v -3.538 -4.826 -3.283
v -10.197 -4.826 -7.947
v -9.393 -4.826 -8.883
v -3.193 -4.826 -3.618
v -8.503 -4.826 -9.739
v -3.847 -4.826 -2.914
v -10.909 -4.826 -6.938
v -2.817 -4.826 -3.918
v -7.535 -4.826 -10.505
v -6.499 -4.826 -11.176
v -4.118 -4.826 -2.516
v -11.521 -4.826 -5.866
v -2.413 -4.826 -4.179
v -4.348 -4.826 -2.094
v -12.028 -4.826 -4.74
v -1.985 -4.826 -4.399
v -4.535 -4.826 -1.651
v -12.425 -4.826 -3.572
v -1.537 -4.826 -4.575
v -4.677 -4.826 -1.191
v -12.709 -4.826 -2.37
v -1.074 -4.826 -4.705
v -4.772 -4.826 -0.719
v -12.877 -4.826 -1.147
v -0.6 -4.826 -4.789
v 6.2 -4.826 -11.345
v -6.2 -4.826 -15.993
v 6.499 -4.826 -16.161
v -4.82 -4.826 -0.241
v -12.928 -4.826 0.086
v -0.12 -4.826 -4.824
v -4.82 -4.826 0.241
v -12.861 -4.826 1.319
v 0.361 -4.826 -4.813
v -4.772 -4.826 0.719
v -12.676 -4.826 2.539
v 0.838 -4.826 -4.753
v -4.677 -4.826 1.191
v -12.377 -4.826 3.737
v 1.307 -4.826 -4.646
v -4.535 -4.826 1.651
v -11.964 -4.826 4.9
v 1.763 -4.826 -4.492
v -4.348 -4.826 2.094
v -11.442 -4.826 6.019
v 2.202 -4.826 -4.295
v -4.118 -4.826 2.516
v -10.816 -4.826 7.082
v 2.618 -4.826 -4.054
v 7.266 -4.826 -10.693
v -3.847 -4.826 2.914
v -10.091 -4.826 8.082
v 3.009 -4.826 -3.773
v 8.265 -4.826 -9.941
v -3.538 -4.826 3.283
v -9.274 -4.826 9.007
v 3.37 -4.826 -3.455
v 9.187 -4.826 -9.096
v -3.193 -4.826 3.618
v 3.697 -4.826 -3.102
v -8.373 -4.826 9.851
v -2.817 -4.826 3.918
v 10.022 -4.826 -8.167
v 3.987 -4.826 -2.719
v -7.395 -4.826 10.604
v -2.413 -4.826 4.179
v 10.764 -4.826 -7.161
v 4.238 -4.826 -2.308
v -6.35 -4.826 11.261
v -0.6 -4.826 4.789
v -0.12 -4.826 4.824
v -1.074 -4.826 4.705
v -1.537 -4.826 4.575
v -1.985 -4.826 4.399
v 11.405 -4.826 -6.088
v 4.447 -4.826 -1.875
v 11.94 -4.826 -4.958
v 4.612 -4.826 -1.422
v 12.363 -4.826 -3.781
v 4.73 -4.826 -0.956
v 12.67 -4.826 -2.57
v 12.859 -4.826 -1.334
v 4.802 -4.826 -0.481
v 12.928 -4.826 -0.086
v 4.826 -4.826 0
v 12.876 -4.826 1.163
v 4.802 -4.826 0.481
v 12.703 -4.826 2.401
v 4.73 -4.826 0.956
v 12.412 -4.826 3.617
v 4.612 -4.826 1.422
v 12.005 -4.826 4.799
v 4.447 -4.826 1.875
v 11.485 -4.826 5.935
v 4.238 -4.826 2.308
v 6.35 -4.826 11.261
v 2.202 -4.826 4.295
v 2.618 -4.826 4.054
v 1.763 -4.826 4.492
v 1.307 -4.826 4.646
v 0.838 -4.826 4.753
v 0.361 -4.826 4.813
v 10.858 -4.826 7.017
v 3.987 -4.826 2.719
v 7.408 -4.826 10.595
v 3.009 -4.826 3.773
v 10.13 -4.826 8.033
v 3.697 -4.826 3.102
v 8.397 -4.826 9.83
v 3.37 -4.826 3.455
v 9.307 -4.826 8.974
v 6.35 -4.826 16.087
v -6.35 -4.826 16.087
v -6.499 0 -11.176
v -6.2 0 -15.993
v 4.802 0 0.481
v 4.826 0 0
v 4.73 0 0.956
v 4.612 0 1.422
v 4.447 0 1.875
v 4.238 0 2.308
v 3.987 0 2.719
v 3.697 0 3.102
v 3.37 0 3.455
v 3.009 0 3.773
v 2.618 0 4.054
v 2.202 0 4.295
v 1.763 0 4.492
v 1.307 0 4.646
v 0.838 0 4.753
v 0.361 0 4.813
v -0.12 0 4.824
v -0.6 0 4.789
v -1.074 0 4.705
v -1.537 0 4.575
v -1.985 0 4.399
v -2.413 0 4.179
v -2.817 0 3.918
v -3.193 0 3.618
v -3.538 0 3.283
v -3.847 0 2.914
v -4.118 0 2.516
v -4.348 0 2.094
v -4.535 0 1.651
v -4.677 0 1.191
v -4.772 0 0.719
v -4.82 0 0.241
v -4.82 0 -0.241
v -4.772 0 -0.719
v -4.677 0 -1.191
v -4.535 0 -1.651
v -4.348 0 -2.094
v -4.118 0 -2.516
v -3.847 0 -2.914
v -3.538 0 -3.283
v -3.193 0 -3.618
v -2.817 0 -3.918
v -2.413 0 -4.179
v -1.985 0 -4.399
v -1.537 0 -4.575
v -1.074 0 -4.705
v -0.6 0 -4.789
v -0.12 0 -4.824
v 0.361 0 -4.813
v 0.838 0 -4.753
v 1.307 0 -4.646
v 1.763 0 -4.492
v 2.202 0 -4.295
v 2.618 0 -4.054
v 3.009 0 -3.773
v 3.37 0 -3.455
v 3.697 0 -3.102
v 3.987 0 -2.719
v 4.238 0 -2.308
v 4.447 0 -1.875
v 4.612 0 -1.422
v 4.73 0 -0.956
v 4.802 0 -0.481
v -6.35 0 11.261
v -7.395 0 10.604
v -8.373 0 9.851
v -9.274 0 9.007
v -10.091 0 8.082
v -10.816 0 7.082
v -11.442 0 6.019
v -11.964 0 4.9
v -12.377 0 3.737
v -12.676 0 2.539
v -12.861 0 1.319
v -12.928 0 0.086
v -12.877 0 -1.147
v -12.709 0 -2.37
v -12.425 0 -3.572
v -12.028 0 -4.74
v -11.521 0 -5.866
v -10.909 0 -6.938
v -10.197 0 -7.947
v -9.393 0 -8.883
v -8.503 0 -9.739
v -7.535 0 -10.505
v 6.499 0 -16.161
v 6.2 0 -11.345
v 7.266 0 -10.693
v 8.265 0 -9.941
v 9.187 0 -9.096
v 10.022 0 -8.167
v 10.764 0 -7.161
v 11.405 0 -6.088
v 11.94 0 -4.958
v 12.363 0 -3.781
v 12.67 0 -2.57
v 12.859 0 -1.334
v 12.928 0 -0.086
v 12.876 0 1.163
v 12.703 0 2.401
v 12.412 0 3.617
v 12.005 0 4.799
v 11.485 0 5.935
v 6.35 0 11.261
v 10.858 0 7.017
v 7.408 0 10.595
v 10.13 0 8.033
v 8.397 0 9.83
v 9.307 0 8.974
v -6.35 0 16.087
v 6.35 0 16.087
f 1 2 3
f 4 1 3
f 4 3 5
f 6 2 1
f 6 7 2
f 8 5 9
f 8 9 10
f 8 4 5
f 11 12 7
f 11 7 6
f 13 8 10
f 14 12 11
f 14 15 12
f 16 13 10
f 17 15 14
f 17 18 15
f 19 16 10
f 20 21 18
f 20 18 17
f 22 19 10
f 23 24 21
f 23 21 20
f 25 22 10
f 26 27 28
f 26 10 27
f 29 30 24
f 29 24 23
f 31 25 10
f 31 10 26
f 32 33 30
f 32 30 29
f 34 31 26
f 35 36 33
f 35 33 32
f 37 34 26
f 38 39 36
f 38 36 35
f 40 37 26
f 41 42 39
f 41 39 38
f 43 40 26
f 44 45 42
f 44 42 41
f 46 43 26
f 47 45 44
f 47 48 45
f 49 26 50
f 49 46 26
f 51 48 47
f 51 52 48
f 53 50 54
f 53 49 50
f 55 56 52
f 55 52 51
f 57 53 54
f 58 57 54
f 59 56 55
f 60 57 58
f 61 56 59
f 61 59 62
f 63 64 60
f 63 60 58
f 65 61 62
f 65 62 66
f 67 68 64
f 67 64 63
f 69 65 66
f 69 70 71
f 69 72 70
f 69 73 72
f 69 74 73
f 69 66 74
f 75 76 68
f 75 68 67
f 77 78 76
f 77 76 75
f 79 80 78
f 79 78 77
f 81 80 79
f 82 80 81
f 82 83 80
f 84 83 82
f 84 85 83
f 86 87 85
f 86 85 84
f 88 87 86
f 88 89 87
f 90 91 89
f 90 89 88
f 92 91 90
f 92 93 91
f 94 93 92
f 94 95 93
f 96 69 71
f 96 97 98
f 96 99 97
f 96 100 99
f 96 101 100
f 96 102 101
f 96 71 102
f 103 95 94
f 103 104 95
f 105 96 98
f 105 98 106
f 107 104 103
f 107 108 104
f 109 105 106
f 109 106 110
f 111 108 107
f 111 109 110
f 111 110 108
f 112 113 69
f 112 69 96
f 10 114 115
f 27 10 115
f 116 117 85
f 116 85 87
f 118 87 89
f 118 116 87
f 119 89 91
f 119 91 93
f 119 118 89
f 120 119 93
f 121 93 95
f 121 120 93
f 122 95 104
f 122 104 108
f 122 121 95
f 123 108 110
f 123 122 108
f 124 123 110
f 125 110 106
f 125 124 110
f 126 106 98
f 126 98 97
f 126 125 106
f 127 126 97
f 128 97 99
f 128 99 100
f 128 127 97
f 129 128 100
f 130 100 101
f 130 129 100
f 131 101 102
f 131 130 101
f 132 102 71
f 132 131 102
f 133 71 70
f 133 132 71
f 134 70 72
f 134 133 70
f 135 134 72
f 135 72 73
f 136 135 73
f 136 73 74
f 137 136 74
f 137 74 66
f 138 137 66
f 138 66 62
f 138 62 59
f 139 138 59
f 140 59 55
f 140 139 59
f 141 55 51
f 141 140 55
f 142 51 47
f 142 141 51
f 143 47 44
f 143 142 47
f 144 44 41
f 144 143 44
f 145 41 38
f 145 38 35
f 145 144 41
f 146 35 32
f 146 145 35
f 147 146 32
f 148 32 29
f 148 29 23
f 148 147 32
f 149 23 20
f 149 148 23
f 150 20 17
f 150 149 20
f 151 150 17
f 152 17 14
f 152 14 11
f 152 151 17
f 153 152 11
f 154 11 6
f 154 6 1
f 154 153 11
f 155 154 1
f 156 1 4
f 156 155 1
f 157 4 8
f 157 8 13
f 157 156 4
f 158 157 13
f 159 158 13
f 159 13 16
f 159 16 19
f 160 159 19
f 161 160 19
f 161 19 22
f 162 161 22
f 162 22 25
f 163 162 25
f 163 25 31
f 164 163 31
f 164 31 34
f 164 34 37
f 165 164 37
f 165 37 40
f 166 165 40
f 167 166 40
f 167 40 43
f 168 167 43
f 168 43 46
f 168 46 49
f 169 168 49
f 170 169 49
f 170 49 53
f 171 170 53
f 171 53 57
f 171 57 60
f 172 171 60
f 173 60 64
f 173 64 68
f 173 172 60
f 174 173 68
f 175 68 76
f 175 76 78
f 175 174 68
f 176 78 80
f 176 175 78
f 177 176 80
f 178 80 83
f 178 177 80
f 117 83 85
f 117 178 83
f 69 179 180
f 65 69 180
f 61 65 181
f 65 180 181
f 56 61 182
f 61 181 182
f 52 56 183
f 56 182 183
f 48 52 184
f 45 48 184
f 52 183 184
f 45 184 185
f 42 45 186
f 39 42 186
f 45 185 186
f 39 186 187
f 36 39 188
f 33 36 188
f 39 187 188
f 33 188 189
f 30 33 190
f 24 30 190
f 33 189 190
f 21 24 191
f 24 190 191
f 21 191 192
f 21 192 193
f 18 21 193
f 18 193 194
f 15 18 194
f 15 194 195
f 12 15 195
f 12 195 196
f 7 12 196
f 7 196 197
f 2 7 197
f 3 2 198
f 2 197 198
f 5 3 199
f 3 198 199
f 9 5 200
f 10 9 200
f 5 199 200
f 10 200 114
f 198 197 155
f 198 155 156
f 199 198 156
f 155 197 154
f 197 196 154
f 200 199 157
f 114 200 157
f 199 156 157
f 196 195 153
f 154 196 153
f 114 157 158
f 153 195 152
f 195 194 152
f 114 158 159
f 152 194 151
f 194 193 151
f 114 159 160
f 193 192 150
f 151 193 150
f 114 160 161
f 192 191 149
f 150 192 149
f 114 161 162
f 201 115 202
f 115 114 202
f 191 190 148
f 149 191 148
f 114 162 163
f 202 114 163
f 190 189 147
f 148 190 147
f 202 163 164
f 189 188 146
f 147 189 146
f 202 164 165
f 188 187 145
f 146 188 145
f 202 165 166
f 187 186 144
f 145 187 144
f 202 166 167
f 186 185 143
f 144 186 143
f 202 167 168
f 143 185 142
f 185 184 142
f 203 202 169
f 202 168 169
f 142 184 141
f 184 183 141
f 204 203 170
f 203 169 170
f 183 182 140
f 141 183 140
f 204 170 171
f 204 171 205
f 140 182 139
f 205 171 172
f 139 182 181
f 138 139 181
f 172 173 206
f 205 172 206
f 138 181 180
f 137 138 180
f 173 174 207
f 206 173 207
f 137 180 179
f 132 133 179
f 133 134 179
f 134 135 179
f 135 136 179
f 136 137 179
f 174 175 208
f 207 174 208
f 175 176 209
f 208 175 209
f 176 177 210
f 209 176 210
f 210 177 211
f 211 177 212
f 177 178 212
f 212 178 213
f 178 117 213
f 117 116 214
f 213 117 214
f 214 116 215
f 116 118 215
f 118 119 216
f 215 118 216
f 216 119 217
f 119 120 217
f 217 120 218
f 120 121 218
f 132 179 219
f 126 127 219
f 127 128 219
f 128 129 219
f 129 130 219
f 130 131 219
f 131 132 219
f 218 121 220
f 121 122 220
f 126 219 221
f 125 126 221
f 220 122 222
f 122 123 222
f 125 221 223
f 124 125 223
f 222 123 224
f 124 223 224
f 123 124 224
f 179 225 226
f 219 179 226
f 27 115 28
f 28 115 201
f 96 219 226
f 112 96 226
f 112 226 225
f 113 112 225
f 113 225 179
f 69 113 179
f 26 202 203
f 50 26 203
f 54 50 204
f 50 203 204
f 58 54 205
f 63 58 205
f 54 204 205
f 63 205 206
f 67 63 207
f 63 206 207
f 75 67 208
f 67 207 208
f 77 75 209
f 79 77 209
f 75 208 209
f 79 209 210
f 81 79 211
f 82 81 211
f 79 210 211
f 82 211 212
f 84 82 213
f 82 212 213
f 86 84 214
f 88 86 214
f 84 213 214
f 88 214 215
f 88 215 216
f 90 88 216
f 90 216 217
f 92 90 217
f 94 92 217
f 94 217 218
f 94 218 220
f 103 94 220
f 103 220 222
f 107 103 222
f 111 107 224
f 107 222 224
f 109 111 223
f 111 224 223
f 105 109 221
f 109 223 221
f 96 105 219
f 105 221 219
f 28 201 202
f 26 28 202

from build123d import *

# Parameters (mm, degrees)
F0_R     = 4.826
F1_DEPTH = 4.826


with BuildPart() as f1:
    # F0 (on Front) → F1 (new body)
    with BuildSketch(Plane.XZ):
        with BuildLine():
            Line((-6.199785, -15.992633), (6.499093, -16.161406))
            Line((6.499093, -16.161406), (6.199785, -11.344696))
            ThreePointArc((6.199785, -11.344696), (12.927958, -0.085905), (6.35, 11.261304))
            Line((6.35, 11.261304), (6.35, 16.087304))
            Line((6.35, 16.087304), (-6.35, 16.087304))
            Line((-6.35, 16.087304), (-6.35, 11.261304))
            ThreePointArc((-6.35, 11.261304), (-12.927958, 0.085905), (-6.499093, -11.175923))
            Line((-6.499093, -11.175923), (-6.199785, -15.992633))
        make_face()
        Circle(F0_R, mode=Mode.SUBTRACT)
    extrude(amount=F1_DEPTH)


solid = f1.part
